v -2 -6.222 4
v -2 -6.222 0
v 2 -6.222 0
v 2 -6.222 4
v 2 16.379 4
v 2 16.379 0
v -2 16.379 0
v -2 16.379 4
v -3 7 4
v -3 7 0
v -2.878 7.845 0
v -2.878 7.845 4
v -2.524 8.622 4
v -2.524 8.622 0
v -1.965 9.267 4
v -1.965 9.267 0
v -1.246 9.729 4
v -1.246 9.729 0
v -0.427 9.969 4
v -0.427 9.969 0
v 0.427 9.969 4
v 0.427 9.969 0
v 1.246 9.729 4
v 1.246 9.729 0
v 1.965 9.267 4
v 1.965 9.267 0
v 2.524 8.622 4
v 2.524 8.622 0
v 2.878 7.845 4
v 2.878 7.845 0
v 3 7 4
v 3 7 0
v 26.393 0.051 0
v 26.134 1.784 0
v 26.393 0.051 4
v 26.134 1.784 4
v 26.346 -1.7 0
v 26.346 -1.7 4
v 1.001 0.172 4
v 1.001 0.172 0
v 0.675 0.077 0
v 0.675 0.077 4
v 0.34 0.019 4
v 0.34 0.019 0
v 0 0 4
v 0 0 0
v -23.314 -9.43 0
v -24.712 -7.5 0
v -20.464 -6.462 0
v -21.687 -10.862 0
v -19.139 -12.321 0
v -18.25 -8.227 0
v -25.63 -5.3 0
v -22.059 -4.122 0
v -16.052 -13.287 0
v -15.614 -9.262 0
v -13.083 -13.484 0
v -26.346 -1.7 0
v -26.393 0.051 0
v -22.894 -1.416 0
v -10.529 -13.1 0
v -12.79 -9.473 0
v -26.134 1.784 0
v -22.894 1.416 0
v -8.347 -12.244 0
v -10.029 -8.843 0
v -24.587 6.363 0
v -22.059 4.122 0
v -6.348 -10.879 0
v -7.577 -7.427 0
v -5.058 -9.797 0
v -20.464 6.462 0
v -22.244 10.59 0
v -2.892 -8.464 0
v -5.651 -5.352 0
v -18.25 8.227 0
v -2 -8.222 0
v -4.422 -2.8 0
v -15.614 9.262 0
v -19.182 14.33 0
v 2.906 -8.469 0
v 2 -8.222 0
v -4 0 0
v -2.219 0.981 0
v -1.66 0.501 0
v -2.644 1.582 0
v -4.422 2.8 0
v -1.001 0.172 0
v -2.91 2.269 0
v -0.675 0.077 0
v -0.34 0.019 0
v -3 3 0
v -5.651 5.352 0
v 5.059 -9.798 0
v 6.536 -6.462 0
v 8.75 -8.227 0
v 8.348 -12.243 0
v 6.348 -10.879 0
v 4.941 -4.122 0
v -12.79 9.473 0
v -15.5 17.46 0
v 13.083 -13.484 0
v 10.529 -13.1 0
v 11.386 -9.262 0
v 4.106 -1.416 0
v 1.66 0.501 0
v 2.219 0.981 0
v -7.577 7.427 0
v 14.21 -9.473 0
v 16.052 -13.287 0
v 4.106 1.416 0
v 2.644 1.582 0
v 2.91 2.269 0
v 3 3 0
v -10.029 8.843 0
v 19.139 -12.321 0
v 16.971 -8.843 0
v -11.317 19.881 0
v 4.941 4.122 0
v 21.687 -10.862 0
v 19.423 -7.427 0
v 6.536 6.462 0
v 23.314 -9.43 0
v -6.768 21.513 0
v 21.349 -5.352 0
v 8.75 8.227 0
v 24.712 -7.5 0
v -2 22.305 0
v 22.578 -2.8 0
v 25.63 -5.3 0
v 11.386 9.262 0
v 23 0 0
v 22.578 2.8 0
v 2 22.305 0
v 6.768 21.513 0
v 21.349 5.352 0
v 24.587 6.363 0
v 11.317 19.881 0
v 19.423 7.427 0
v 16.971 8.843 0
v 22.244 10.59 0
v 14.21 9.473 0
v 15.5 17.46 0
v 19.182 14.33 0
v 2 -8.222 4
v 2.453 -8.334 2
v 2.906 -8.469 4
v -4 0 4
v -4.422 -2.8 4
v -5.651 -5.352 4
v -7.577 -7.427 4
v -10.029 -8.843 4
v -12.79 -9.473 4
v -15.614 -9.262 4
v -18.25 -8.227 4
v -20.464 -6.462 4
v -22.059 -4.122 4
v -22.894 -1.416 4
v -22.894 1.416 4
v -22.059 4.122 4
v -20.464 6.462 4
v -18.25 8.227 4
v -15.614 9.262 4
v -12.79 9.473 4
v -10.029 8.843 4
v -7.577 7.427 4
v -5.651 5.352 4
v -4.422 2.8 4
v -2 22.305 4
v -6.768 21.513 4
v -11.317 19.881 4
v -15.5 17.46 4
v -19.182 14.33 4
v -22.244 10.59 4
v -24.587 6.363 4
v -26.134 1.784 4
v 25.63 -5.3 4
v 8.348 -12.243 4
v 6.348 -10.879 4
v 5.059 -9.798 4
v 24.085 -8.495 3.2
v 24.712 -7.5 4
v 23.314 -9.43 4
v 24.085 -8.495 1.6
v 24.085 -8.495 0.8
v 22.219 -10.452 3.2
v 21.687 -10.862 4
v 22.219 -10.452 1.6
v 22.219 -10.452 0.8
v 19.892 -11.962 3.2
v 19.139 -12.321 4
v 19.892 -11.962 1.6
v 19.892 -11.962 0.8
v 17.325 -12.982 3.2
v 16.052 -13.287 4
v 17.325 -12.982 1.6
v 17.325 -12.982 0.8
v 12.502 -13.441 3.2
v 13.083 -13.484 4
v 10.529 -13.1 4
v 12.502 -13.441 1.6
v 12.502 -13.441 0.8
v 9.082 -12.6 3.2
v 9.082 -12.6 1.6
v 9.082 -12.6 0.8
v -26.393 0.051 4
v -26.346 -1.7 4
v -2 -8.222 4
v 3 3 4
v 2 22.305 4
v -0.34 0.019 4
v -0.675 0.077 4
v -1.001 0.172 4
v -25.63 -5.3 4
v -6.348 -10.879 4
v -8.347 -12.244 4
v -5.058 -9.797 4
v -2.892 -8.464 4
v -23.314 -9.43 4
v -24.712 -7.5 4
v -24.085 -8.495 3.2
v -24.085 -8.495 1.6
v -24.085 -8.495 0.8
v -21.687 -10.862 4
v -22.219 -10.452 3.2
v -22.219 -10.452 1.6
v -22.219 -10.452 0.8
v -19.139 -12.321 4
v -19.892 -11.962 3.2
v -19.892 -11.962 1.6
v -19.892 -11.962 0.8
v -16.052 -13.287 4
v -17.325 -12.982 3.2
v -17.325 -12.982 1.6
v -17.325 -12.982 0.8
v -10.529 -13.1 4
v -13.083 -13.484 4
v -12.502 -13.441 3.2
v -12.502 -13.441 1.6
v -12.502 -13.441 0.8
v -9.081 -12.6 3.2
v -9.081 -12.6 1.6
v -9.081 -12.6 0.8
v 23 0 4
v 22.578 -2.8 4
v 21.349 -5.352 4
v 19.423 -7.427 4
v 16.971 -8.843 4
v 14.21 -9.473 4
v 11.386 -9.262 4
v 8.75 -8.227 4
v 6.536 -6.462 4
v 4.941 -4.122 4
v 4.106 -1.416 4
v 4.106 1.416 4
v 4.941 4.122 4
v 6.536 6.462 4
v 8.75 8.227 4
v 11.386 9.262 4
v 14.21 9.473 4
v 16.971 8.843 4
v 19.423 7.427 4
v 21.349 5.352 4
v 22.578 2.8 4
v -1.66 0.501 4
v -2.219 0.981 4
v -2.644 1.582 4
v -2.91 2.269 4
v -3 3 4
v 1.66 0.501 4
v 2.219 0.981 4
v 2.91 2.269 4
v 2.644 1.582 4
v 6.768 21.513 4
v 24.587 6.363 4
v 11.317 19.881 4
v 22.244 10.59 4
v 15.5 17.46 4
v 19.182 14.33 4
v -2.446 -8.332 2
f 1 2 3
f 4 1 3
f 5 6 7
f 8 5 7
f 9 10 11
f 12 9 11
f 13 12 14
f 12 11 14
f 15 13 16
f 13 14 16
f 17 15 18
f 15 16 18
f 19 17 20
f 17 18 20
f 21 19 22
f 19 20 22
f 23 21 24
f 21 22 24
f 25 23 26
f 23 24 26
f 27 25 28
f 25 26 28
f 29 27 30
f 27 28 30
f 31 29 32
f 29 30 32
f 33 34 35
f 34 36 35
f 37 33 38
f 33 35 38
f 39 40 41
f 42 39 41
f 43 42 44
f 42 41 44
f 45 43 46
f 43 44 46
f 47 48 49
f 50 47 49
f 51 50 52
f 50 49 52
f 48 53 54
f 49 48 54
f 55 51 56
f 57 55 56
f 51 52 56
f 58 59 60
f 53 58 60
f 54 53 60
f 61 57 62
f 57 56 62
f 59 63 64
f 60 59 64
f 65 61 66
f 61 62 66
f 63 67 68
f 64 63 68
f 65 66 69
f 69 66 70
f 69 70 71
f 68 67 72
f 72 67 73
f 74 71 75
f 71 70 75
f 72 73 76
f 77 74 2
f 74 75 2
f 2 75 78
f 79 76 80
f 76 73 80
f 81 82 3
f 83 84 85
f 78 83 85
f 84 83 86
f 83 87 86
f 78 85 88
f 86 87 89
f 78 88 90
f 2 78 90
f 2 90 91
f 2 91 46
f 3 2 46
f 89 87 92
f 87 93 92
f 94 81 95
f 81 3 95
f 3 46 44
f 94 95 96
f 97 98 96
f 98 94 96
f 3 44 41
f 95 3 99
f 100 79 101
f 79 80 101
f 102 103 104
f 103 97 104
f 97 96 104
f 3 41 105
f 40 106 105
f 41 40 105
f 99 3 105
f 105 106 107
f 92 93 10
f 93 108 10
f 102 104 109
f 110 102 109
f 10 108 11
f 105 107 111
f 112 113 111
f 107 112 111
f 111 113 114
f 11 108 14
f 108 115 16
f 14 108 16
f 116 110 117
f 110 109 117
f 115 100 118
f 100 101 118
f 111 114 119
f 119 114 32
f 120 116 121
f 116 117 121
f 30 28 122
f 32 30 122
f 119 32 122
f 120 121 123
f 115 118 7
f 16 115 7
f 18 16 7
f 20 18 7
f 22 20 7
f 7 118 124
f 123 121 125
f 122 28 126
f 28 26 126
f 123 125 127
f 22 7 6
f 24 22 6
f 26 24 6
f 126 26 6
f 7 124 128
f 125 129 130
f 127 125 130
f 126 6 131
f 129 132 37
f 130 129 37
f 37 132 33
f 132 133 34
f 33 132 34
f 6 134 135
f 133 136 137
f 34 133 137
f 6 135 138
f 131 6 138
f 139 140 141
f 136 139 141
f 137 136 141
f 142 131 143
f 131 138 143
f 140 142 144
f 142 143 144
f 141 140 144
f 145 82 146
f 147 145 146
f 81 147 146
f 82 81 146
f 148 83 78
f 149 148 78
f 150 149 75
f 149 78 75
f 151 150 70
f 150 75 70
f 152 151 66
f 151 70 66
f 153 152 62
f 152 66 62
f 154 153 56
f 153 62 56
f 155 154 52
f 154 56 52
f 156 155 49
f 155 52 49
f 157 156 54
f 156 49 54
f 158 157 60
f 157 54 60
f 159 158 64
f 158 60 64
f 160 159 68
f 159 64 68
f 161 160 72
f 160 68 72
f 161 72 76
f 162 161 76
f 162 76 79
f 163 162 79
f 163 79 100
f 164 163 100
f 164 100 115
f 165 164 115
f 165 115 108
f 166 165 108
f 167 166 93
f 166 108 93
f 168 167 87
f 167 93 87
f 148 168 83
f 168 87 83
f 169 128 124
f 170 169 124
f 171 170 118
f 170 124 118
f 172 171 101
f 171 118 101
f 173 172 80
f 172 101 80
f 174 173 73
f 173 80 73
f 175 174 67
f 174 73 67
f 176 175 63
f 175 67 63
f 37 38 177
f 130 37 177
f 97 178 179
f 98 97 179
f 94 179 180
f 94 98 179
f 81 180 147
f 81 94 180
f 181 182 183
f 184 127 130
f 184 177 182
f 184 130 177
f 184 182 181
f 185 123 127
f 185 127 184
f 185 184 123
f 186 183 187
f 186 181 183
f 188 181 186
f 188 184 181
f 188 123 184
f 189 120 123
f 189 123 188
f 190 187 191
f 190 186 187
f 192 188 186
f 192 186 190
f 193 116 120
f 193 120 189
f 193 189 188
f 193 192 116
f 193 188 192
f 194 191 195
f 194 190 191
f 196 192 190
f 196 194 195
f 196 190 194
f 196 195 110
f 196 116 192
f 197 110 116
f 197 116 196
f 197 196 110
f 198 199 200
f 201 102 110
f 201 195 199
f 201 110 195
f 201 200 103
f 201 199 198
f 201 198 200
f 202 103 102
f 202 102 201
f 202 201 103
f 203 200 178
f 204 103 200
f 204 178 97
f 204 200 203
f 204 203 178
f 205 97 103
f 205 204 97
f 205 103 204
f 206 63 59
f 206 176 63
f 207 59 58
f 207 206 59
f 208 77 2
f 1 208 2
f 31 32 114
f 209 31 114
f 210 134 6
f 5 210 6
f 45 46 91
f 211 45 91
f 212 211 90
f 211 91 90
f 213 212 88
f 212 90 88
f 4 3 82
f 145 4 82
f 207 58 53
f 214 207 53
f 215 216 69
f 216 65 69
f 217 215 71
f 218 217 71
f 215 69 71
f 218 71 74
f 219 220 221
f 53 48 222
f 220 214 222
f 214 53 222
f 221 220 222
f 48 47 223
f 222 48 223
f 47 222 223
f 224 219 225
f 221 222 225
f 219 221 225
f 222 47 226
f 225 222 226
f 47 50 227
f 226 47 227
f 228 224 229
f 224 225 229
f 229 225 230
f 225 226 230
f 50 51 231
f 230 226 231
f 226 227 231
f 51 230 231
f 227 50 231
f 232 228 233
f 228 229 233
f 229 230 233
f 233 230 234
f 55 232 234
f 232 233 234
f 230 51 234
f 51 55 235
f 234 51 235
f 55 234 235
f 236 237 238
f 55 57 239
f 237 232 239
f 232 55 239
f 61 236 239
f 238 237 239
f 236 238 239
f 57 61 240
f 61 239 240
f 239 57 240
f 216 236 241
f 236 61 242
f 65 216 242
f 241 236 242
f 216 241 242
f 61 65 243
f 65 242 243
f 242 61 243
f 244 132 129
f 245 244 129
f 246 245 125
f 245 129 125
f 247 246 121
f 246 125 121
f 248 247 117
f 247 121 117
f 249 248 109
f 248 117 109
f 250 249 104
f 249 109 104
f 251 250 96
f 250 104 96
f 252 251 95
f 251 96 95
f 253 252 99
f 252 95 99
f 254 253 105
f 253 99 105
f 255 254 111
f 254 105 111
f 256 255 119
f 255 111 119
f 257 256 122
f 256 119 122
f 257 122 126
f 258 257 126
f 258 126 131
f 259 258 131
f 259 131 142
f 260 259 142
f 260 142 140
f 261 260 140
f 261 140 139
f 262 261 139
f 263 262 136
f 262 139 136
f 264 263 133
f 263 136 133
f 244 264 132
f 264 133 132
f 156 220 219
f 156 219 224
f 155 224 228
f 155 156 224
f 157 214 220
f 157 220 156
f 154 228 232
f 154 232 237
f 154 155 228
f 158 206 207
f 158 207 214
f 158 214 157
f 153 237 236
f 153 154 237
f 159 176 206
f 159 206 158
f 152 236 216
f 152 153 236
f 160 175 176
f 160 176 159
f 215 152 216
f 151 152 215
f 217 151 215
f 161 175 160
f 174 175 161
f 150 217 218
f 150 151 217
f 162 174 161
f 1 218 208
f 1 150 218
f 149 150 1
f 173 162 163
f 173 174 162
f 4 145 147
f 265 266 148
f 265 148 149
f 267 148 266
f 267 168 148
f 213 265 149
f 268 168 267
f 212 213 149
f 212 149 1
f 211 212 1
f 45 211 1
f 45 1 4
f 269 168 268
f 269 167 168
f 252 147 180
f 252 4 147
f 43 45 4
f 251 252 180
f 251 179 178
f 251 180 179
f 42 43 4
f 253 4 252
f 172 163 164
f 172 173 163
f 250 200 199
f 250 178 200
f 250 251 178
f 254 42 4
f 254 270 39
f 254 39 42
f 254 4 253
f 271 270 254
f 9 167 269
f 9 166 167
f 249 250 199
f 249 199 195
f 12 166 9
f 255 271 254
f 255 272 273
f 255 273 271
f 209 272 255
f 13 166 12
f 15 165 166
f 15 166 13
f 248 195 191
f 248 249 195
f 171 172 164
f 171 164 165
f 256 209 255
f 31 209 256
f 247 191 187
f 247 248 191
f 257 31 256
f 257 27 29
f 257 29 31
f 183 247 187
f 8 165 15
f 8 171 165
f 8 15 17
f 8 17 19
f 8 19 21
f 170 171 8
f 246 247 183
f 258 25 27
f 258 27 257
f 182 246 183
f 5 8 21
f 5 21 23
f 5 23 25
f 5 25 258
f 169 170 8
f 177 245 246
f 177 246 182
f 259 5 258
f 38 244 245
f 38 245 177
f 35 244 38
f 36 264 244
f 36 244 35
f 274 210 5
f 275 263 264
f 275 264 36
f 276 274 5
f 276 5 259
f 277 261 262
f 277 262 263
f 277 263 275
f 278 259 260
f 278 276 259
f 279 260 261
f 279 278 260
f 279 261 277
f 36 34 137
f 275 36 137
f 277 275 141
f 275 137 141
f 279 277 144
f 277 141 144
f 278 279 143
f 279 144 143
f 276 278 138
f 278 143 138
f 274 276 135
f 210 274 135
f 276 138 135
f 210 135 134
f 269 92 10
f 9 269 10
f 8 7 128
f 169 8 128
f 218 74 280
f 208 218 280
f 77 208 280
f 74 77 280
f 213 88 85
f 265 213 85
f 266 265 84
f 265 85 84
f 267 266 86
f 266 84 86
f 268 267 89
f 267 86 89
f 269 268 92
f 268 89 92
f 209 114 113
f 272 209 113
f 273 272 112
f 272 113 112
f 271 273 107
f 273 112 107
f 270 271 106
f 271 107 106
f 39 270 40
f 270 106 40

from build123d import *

# Parameters (mm, degrees)
ESTRUSIONE_ESTRUSIONE1_DEPTH = 4
RACCORDO1_R                  = 10
RACCORDO2_R                  = 10


with BuildPart() as part:
    # Schizzo1 → Estrusione-Estrusione1 (new body)
    with BuildSketch(Plane.XY):
        with BuildLine():
            ThreePointArc((-23, 0), (-13.5, 9.5), (-4, 0))
            Line((-4, 0), (-1, 0))
            ThreePointArc((-1, 0), (-1.000295828, 0.085997792), (-1.001183299, 0.171991513))
            ThreePointArc((-1.001183299, 0.171991513), (-2.449852026, 1.268461652), (-3, 3))
            Line((-3, 3), (-3, 6.782329983))
            ThreePointArc((-3, 6.782329983), (-17.035533906, 11.989578808), (-26, 0))
            Line((-26, 0), (-23, 0))
        make_face()
        with BuildLine():
            Line((-1, 0), (-4, 0))
            ThreePointArc((-4, 0), (-13.5, -9.5), (-23, 0))
            Line((-23, 0), (-26, 0))
            ThreePointArc((-26, 0), (-19.090169944, -11.180339887), (-6, -10))
            ThreePointArc((-6, -10), (-2.319660113, -5.590169944), (-1, 0))
        make_face()
        with BuildLine():
            ThreePointArc((-1.001183299, 0.171991513), (-1.000295828, 0.085997792), (-1, 0))
            Line((-1, 0), (-9e-09, 0))
            ThreePointArc((-9e-09, 0), (-0.507924477, 0.043310512), (-1.001183299, 0.171991513))
        make_face()
        with BuildLine():
            Line((-9e-09, 0), (-1, 0))
            ThreePointArc((-1, 0), (-2.319660113, -5.590169944), (-6, -10))
            add(Edge.make_bspline(
                [(-6, -10), (-4.445769188, -8.963846126), (-2.891538377, -8.464499677)],
                knots=[0, 0, 0, 0.259038469, 0.259038469, 0.259038469], degree=2))
            add(Edge.make_bspline(
                [(-2.891538377, -8.464499677), (-2.445769188, -8.321282042), (-2, -8.222222222)],
                knots=[0.259038469, 0.259038469, 0.259038469, 0.333333333, 0.333333333, 0.333333333], degree=2))
            Line((-2, -8.222222222), (-2, -6.222222222))
            Line((-2, -6.222222222), (2, -6.222222222))
            Line((2, -6.222222222), (2, -8.222222222))
            add(Edge.make_bspline(
                [(2, -8.222222222), (2.453171695, -8.322927043), (2.90634339, -8.469268439)],
                knots=[0.666666667, 0.666666667, 0.666666667, 0.742195282, 0.742195282, 0.742195282], degree=2))
            add(Edge.make_bspline(
                [(2.90634339, -8.469268439), (4.453171695, -8.96878113), (6, -10)],
                knots=[0.742195282, 0.742195282, 0.742195282, 1, 1, 1], degree=2))
            ThreePointArc((6, -10), (2.319660113, -5.590169944), (1, 0))
            Line((1, 0), (-9e-09, 0))
        make_face()
        with BuildLine():
            ThreePointArc((-6, -10), (-19.090169944, -11.180339887), (-26, 0))
            Line((-26, 0), (-26.5, 0))
            add(Edge.make_bspline(
                [(-26.5, 0), (-26.289597686, -2.99847523), (-25.218910816, -9.881888417), (-17.201760367, -13.618078309), (-10.427980074, -13.430387712), (-7.346751114, -12.011307512), (-4.709599107, -9.378573644), (-2.891538377, -8.464499677)],
                knots=[0, 0, 0, 0, 0.254741044, 0.563192357, 0.634676404, 0.898097469, 1, 1, 1, 1], degree=3))
            add(Edge.make_bspline(
                [(-6, -10), (-4.445769188, -8.963846126), (-2.891538377, -8.464499677)],
                knots=[0, 0, 0, 0.259038469, 0.259038469, 0.259038469], degree=2))
        make_face()
        with BuildLine():
            Line((-26.5, 0), (-26, 0))
            ThreePointArc((-26, 0), (-17.035533906, 11.989578808), (-3, 6.782329983))
            Line((-3, 6.782329983), (-3, 7))
            ThreePointArc((-3, 7), (0, 10), (3, 7))
            Line((3, 7), (3, 6.782329983))
            ThreePointArc((3, 6.782329983), (17.035533906, 11.989578808), (26, 0))
            Line((26, 0), (26.5, 0))
            ThreePointArc((26.5, 0), (18.095278025, 15.376139293), (2, 22.304850307))
            Line((2, 22.304850307), (2, 16.379360111))
            Line((2, 16.379360111), (-2, 16.379360111))
            Line((-2, 16.379360111), (-2, 22.304850307))
            ThreePointArc((-2, 22.304850307), (-18.095278025, 15.376139293), (-26.5, 0))
        make_face()
        with BuildLine():
            ThreePointArc((1.001183299, 0.171991513), (0.507924468, 0.043310511), (-9e-09, 0))
            Line((-9e-09, 0), (1, 0))
            ThreePointArc((1, 0), (1.000295828, 0.085997792), (1.001183299, 0.171991513))
        make_face()
        with BuildLine():
            ThreePointArc((1.001183299, 0.171991513), (1.000295828, 0.085997792), (1, 0))
            Line((1, 0), (4, 0))
            ThreePointArc((4, 0), (13.5, 9.5), (23, 0))
            Line((23, 0), (26, 0))
            ThreePointArc((26, 0), (17.035533906, 11.989578808), (3, 6.782329983))
            Line((3, 6.782329983), (3, 3))
            ThreePointArc((3, 3), (2.449852026, 1.268461652), (1.001183299, 0.171991513))
        make_face()
        with BuildLine():
            Line((4, 0), (1, 0))
            ThreePointArc((1, 0), (2.319660113, -5.590169944), (6, -10))
            ThreePointArc((6, -10), (19.090169944, -11.180339887), (26, 0))
            Line((26, 0), (23, 0))
            ThreePointArc((23, 0), (13.5, -9.5), (4, 0))
        make_face()
        with BuildLine():
            ThreePointArc((26, 0), (19.090169944, -11.180339887), (6, -10))
            add(Edge.make_bspline(
                [(2.90634339, -8.469268439), (4.453171695, -8.96878113), (6, -10)],
                knots=[0.742195282, 0.742195282, 0.742195282, 1, 1, 1], degree=2))
            add(Edge.make_bspline(
                [(26.5, 0), (26.289638323, -2.998481264), (25.218829564, -9.881876352), (17.20194664, -13.618105968), (10.427790666, -13.430359587), (7.351087048, -12.012249752), (4.709964683, -9.380290908), (2.90634339, -8.469268439)],
                knots=[0, 0, 0, 0, 0.254741044, 0.563192357, 0.634676404, 0.898097469, 0.999864445, 0.999864445, 0.999864445, 0.999864445], degree=3))
            Line((26.5, 0), (26, 0))
        make_face()
    extrude(amount=ESTRUSIONE_ESTRUSIONE1_DEPTH)

    # Raccordo1
    raccordo1_edges = [part.edges().sort_by_distance(p)[0] for p in [
        (-26.5, 0, 2),
    ]]
    fillet(raccordo1_edges, radius=RACCORDO1_R)

    # Raccordo2
    raccordo2_edges = [part.edges().sort_by_distance(p)[0] for p in [
        (26.5, 0, 2),
    ]]
    fillet(raccordo2_edges, radius=RACCORDO2_R)


solid = part.part
